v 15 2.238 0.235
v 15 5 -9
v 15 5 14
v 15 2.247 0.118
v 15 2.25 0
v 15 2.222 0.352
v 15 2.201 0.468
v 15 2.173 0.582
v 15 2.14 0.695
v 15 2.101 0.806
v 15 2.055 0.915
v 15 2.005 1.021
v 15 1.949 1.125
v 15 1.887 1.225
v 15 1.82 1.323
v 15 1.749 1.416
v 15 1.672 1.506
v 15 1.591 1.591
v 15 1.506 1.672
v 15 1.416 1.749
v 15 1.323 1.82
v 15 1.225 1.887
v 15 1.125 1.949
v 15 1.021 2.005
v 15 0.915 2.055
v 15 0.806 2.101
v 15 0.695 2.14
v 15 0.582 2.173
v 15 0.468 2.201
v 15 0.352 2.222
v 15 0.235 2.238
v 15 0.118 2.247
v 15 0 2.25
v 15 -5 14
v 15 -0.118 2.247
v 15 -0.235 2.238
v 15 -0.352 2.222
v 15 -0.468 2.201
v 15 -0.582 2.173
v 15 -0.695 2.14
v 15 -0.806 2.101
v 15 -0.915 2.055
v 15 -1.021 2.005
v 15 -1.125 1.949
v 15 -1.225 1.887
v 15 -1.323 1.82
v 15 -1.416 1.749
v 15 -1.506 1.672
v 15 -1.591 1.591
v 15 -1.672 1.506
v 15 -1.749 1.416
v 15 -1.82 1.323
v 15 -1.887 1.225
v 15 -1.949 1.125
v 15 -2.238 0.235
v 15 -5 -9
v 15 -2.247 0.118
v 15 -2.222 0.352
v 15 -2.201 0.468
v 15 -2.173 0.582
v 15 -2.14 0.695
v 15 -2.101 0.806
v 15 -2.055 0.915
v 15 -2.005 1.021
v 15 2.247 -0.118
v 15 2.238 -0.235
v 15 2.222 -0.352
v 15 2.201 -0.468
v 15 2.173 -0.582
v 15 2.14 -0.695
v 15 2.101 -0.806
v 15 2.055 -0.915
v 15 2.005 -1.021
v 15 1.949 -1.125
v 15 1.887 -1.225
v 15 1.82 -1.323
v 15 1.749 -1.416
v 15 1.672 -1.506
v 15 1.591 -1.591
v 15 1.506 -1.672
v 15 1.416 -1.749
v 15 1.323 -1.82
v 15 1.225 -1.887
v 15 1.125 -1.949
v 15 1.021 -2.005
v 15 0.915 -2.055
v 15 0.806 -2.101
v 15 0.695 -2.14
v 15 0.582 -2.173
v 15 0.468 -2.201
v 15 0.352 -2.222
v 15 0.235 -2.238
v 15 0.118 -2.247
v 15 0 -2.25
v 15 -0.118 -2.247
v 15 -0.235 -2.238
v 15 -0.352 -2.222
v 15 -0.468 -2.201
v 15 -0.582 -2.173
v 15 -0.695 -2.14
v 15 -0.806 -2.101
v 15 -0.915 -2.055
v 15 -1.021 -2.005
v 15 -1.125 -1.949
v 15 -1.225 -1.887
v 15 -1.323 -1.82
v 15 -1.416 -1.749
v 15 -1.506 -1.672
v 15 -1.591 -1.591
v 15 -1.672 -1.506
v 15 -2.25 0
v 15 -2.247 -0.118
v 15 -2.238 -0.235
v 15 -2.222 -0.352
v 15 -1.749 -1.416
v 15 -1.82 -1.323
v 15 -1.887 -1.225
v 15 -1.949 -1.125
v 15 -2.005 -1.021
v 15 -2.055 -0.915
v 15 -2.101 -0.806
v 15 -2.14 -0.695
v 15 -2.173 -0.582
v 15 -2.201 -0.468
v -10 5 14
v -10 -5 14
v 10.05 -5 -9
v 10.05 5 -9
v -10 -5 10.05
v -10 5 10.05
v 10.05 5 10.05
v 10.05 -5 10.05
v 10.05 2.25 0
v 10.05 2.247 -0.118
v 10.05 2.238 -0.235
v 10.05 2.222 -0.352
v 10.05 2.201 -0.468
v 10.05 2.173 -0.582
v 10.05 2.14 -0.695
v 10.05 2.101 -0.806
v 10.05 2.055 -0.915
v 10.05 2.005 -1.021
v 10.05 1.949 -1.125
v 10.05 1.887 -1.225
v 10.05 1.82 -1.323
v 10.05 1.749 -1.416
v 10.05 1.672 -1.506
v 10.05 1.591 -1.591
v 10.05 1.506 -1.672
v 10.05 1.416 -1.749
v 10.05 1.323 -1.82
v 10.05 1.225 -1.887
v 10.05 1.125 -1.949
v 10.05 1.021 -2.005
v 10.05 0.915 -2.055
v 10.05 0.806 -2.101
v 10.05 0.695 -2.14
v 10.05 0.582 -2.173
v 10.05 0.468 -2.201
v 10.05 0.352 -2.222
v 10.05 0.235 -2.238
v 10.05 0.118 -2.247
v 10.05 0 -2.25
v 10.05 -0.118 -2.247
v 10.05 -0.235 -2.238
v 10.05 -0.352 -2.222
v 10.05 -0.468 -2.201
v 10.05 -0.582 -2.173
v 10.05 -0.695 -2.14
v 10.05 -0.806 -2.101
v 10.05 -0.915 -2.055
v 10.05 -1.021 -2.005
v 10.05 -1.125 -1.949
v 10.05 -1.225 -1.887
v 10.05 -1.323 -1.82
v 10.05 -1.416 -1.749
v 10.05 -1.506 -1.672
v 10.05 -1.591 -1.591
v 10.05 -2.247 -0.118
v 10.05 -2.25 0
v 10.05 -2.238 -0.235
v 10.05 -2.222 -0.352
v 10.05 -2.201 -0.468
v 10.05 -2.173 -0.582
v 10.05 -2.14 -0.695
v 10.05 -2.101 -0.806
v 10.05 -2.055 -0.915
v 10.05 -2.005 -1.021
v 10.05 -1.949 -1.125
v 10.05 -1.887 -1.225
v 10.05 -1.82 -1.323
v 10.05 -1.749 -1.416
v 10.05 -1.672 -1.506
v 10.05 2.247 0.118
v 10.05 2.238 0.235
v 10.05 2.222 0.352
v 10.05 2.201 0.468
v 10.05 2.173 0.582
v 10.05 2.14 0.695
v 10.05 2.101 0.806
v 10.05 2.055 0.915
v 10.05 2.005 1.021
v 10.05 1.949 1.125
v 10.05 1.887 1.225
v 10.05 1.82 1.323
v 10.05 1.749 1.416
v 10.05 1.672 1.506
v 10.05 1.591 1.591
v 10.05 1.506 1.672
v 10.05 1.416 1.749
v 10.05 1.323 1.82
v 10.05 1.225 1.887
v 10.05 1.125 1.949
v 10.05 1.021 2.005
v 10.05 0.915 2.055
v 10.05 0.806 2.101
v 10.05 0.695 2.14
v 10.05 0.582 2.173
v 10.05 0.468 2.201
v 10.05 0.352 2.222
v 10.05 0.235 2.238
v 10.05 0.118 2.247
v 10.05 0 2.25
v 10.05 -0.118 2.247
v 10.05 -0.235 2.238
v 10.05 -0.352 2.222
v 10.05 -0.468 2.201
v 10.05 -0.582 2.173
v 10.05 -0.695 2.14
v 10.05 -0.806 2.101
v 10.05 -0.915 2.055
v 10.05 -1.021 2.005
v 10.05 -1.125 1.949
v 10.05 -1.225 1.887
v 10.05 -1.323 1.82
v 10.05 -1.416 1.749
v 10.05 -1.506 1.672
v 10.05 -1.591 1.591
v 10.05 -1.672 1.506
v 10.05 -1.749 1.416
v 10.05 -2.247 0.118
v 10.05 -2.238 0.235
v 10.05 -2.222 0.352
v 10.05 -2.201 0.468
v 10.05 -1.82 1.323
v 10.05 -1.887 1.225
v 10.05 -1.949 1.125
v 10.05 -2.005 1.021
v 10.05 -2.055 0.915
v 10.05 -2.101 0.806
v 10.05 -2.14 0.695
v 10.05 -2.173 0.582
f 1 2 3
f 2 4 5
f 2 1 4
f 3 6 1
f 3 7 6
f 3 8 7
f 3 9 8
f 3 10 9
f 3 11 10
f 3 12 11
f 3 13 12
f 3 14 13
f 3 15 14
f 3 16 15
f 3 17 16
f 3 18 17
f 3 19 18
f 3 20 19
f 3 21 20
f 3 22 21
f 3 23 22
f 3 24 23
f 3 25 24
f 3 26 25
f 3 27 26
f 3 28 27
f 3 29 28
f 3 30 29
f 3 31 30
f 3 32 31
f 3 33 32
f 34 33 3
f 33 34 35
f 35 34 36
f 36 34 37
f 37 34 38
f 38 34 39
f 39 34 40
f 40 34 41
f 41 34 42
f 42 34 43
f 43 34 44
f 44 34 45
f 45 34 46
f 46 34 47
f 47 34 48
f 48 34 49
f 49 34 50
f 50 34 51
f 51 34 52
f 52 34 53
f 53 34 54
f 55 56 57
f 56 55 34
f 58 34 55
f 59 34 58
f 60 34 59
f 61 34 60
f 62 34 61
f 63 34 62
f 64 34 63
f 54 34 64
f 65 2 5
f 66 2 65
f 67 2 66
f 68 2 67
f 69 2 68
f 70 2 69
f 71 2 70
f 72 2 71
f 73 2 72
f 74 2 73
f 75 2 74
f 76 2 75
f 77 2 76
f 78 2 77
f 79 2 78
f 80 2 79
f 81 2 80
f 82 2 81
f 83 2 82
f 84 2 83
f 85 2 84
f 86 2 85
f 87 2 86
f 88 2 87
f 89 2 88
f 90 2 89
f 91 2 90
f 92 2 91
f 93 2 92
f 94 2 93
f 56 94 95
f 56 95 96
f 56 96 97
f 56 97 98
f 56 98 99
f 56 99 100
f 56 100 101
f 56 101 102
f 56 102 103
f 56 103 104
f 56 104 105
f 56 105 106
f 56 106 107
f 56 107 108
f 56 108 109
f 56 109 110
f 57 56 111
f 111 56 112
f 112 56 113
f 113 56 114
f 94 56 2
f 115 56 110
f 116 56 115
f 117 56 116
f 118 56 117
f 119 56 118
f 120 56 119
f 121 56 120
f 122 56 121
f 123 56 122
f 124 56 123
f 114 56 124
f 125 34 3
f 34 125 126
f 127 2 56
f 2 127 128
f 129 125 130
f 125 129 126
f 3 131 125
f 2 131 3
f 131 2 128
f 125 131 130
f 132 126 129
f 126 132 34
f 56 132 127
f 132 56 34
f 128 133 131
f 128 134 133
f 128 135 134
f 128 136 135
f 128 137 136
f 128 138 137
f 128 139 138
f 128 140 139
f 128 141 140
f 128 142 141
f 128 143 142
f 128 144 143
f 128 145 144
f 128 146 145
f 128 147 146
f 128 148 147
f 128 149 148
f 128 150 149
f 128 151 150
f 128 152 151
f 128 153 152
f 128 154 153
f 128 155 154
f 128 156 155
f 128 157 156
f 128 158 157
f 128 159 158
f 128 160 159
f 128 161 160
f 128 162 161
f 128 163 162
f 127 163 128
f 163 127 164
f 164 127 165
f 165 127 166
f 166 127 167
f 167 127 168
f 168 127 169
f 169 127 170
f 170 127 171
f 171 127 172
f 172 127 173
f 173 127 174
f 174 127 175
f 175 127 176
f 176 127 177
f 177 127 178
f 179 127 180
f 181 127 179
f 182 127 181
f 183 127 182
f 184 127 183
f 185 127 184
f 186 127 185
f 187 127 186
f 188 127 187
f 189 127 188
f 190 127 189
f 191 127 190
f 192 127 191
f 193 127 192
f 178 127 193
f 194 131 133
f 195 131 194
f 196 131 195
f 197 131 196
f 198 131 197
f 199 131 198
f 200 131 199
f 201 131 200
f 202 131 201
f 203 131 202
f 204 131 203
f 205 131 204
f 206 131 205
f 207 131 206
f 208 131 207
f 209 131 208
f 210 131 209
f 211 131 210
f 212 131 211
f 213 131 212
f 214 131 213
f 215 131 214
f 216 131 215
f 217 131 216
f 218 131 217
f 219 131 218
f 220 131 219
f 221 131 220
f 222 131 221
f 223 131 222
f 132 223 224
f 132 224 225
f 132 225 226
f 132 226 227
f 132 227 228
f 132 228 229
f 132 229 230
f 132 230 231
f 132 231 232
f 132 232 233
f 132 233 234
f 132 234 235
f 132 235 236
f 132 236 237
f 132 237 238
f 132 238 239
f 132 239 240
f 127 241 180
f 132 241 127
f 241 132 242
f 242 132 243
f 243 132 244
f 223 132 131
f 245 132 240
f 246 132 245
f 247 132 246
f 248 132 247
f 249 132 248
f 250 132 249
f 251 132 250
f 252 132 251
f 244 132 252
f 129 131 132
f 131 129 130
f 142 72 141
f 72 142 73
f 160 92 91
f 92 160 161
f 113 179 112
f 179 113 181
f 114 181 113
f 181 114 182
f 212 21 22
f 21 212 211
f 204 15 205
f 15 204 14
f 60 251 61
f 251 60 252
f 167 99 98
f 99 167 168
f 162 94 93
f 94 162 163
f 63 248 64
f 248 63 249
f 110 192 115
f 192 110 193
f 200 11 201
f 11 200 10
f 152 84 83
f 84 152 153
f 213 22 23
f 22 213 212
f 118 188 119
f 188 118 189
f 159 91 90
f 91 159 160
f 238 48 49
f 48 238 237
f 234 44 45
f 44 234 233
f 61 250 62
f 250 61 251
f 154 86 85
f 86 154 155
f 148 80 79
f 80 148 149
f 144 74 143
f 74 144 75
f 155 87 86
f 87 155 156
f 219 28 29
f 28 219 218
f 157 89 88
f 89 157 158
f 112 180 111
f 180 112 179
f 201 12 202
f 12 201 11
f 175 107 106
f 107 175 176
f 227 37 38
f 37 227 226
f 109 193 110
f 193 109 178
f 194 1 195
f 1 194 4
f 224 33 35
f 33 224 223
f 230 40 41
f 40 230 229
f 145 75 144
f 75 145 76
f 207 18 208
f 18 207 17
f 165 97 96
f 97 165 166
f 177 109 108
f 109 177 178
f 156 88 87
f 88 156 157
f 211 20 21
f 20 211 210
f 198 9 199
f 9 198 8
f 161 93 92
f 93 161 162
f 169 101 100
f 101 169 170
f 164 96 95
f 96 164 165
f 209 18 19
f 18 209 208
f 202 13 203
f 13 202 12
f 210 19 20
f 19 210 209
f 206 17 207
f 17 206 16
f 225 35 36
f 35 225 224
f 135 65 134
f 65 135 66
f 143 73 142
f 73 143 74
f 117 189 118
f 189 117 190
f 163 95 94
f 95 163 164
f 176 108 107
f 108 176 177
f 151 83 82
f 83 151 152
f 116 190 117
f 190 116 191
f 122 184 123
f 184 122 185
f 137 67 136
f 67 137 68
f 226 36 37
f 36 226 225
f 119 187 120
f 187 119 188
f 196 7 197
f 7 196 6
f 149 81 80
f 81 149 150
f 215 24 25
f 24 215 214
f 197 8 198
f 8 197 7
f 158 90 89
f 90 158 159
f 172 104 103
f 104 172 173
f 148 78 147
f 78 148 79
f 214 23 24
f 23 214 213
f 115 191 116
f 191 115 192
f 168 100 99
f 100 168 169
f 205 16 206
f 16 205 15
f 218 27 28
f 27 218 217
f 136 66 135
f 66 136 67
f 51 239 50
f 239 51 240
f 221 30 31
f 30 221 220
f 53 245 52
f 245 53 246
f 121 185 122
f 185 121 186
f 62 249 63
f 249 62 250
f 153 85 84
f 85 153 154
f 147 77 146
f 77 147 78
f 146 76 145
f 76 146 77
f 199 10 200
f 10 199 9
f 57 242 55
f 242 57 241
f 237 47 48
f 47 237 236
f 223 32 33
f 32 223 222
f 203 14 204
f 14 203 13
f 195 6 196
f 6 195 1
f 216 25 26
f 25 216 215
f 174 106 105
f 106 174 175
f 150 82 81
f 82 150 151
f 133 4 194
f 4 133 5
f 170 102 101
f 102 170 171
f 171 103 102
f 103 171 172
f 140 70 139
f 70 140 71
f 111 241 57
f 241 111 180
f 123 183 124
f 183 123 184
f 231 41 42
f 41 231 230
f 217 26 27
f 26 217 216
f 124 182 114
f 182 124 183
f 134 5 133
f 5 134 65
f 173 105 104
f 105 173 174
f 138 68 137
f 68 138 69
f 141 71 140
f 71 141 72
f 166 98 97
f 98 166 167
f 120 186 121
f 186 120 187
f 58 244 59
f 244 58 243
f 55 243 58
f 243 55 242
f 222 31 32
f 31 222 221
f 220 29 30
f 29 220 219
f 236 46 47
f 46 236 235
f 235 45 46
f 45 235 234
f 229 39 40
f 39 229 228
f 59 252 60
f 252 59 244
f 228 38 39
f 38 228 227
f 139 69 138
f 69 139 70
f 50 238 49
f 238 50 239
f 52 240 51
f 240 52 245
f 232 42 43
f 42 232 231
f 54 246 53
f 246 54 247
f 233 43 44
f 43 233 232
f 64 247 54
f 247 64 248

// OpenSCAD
difference() {
  translate([2.5, 0, 2.5]) cube([25, 10, 23], center=true);

  translate([0, 0, 0]) cube([20.1, 10.1, 20.1], center=true);
  translate([15, 0, 0]) rotate([0, 90, 0]) cylinder(h=10, d=4.5, center=true, $fn=120);
}
